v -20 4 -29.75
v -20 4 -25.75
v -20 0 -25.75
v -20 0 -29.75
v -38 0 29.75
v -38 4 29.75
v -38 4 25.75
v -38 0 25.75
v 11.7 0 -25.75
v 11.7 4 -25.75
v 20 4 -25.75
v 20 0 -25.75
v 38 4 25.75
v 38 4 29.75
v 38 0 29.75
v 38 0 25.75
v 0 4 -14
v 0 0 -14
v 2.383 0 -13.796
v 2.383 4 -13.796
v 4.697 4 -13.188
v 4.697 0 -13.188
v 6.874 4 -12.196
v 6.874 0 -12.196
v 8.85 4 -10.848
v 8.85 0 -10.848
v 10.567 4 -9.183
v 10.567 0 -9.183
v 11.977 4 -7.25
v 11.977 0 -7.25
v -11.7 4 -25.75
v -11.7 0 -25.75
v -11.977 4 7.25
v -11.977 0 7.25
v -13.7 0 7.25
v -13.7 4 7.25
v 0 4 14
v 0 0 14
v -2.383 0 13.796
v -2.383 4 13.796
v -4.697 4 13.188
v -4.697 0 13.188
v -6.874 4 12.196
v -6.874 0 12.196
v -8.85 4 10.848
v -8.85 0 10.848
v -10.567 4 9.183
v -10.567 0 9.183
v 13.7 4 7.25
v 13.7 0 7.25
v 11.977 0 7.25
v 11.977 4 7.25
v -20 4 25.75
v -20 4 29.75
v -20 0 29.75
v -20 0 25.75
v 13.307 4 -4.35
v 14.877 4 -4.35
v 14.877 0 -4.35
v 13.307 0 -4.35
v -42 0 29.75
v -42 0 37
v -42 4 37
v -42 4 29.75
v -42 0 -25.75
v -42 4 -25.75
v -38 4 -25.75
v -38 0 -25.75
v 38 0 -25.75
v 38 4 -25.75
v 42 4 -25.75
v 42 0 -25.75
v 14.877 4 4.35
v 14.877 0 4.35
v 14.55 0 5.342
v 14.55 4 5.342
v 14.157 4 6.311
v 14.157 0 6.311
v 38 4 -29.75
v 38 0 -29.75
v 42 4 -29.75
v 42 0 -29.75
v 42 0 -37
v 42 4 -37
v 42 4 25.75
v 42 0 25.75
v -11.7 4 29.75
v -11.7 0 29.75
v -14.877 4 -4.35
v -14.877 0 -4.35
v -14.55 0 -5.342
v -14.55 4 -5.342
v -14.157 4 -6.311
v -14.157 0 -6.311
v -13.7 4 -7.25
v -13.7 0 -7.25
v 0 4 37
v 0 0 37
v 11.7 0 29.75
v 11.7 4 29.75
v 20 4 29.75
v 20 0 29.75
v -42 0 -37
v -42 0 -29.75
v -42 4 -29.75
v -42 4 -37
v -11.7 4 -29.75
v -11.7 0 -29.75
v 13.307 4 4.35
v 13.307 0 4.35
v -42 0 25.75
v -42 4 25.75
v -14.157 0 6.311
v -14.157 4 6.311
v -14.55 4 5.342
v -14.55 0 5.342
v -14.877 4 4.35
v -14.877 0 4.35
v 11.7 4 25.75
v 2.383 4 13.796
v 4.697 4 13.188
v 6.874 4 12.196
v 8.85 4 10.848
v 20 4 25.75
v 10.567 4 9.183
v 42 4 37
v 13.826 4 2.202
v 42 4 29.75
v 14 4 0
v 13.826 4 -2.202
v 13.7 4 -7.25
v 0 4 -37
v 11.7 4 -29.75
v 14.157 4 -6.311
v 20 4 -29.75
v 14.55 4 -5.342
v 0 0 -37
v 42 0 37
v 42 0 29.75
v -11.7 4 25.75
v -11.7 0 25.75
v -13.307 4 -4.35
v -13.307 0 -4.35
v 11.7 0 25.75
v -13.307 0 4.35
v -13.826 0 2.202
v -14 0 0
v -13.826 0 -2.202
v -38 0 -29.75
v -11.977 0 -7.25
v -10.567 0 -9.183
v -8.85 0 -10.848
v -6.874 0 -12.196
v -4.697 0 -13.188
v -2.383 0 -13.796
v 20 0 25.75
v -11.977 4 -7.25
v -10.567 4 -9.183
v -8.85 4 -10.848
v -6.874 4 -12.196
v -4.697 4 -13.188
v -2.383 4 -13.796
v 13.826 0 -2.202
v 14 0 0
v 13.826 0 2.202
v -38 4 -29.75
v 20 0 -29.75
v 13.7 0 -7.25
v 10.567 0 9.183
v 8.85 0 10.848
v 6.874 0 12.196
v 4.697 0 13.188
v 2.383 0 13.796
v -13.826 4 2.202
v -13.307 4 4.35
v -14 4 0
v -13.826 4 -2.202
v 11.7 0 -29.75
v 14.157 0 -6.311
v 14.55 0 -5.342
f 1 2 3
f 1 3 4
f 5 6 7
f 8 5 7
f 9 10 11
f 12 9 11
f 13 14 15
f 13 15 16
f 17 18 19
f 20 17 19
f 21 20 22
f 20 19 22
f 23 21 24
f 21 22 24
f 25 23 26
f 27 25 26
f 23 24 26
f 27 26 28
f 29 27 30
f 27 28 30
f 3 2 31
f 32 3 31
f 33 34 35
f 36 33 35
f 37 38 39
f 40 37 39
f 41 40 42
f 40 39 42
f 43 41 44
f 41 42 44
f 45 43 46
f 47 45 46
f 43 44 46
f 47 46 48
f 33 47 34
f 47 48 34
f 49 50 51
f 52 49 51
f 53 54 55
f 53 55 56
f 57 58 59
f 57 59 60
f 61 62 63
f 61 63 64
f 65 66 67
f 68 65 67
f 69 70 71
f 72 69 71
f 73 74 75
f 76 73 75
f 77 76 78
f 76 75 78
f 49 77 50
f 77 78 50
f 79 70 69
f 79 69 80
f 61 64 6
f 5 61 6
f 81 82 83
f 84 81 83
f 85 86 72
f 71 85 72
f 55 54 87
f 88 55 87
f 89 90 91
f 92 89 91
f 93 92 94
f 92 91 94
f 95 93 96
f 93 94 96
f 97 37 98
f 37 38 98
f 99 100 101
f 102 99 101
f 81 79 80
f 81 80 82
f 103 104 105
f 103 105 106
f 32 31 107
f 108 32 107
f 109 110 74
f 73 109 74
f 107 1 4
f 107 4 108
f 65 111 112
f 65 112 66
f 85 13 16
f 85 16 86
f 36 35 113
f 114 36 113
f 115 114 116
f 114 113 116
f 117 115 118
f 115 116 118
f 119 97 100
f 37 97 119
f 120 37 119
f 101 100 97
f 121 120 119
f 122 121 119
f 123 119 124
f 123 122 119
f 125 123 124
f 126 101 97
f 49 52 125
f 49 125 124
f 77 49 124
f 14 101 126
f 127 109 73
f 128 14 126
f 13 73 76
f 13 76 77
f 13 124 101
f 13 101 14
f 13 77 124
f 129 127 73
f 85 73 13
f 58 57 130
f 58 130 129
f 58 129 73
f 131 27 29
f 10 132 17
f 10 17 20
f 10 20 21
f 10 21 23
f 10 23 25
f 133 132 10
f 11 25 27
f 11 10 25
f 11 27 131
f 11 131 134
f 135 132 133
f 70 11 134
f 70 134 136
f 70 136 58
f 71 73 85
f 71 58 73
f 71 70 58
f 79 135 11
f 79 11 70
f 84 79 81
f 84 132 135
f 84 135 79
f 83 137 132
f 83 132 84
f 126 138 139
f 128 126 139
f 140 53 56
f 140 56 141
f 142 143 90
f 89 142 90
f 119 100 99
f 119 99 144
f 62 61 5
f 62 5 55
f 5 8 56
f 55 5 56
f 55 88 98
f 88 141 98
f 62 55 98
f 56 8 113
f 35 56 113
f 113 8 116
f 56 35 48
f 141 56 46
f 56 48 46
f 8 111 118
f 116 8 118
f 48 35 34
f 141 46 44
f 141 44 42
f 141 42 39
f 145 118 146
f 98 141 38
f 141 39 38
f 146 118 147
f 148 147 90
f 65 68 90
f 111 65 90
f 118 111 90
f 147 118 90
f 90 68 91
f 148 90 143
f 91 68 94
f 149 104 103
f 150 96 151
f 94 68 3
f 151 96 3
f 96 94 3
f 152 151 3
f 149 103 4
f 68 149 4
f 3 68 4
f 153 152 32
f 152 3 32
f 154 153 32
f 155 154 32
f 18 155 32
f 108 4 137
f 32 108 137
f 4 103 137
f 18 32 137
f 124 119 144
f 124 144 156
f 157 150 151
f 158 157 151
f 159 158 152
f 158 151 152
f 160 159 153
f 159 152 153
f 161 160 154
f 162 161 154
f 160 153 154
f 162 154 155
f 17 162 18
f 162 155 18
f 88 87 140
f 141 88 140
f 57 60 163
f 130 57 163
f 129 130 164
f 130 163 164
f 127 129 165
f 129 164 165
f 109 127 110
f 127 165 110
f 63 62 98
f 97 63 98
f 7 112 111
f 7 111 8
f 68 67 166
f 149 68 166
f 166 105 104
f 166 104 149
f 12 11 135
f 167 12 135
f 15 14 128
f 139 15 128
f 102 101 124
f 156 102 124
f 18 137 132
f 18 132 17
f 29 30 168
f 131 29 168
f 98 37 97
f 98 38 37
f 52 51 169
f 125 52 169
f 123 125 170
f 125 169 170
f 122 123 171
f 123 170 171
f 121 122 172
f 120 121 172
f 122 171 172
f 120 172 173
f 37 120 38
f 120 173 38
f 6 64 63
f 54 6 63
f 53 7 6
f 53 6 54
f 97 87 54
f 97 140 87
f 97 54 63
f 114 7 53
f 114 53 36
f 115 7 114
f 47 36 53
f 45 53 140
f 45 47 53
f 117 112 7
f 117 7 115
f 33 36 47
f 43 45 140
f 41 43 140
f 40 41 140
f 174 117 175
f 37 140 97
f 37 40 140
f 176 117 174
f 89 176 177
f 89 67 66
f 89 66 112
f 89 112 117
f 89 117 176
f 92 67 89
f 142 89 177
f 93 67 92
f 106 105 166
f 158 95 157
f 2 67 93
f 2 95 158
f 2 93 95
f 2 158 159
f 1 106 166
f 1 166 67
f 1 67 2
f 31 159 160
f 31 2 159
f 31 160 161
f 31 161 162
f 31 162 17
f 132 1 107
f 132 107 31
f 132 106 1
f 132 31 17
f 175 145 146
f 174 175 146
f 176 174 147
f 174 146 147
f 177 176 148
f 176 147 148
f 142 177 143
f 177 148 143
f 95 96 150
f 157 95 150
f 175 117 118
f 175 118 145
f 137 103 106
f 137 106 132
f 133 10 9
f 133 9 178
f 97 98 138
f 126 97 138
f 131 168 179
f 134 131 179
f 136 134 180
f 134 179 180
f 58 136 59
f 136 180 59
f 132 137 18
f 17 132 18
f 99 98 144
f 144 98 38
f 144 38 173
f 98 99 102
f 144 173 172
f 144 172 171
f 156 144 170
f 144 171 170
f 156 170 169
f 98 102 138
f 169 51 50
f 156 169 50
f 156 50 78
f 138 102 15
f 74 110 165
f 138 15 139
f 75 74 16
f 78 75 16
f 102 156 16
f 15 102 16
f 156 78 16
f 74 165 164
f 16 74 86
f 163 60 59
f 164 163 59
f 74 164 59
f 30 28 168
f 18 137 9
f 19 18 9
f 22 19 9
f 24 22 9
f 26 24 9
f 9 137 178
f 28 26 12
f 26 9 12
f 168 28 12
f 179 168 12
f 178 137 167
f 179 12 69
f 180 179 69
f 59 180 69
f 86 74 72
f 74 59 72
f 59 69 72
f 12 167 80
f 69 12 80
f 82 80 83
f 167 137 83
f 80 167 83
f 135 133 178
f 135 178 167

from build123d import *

# Parameters (mm, degrees)
SKETCH2_W               = 84
SKETCH2_H               = 74
BOSS_EXTRUDE1_DEPTH     = 4
SKETCH4_W               = 8.3
SKETCH4_H               = 4
SKETCH4_W_2             = 4
CUT_EXTRUDE2_DEPTH      = 1
CUT_EXTRUDE2_DEPTH_BACK = 5


with BuildPart() as part:
    # Sketch2 → Boss-Extrude1 (new body)
    with BuildSketch(Plane(origin=(0, 0, 0), x_dir=(1, 0, 0), z_dir=(0, 1, 0))):
        Rectangle(SKETCH2_W, SKETCH2_H)
        with BuildLine():
            ThreePointArc((13.307047005, 4.35), (14, 0), (13.307047005, -4.35))
            Line((13.307047005, -4.35), (14.877079687, -4.35))
            ThreePointArc((14.877079687, -4.35), (14.361878956, -5.829788405), (13.699908759, -7.25))
            Line((13.699908759, -7.25), (11.976539567, -7.25))
            ThreePointArc((11.976539567, -7.25), (0, -14), (-11.976539567, -7.25))
            Line((-11.976539567, -7.25), (-13.699908759, -7.25))
            ThreePointArc((-13.699908759, -7.25), (-14.361878956, -5.829788405), (-14.877079687, -4.35))
            Line((-14.877079687, -4.35), (-13.307047005, -4.35))
            ThreePointArc((-13.307047005, -4.35), (-14, 0), (-13.307047005, 4.35))
            Line((-13.307047005, 4.35), (-14.877079687, 4.35))
            ThreePointArc((-14.877079687, 4.35), (-14.361878956, 5.829788405), (-13.699908759, 7.25))
            Line((-13.699908759, 7.25), (-11.976539567, 7.25))
            ThreePointArc((-11.976539567, 7.25), (0, 14), (11.976539567, 7.25))
            Line((11.976539567, 7.25), (13.699908759, 7.25))
            ThreePointArc((13.699908759, 7.25), (14.361878956, 5.829788405), (14.877079687, 4.35))
            Line((14.877079687, 4.35), (13.307047005, 4.35))
        make_face(mode=Mode.SUBTRACT)
    extrude(amount=BOSS_EXTRUDE1_DEPTH)


with BuildPart() as body_2:
    # Split1: the piece on the far side of the plane
    add(part.part)
    split(bisect_by=Plane(origin=(0, 0, 0), x_dir=(0, 0, 1), z_dir=(1, 0, 0)), keep=Keep.BOTTOM)


with BuildPart() as part_1:
    add(part.part)

    # Split1
    split(bisect_by=Plane(origin=(0, 0, 0), x_dir=(0, 0, 1), z_dir=(1, 0, 0)), keep=Keep.TOP)


with BuildPart() as cut_extrude2_tool:
    # Sketch4 → Cut-Extrude2 (new body, two sides)
    with BuildSketch(Plane(origin=(0, 4, 0), x_dir=(1, 0, 0), z_dir=(0, 1, 0))) as cut_extrude2_sk:
        with Locations((-15.85, -27.75)):
            Rectangle(SKETCH4_W, SKETCH4_H)
        with Locations((-40, -27.75)):
            Rectangle(SKETCH4_W_2, SKETCH4_H)
        with Locations((40, -27.75)):
            Rectangle(SKETCH4_W_2, SKETCH4_H)
        with Locations((15.85, -27.75)):
            Rectangle(SKETCH4_W, SKETCH4_H)
        with Locations((15.85, 27.75)):
            Rectangle(SKETCH4_W, SKETCH4_H)
        with Locations((40, 27.75)):
            Rectangle(SKETCH4_W_2, SKETCH4_H)
        with Locations((-40, 27.75)):
            Rectangle(SKETCH4_W_2, SKETCH4_H)
        with Locations((-15.85, 27.75)):
            Rectangle(SKETCH4_W, SKETCH4_H)
    extrude(amount=CUT_EXTRUDE2_DEPTH)
    extrude(cut_extrude2_sk.sketch, amount=-CUT_EXTRUDE2_DEPTH_BACK)


with BuildPart() as part_2:
    add(part_1.part)

    # Cut-Extrude2: cut by cut_extrude2_tool
    add(cut_extrude2_tool.part, mode=Mode.SUBTRACT)


with BuildPart() as body_2_1:
    add(body_2.part)

    # Cut-Extrude2: cut by cut_extrude2_tool
    add(cut_extrude2_tool.part, mode=Mode.SUBTRACT)


solid = Compound([part_2.part, body_2_1.part])
